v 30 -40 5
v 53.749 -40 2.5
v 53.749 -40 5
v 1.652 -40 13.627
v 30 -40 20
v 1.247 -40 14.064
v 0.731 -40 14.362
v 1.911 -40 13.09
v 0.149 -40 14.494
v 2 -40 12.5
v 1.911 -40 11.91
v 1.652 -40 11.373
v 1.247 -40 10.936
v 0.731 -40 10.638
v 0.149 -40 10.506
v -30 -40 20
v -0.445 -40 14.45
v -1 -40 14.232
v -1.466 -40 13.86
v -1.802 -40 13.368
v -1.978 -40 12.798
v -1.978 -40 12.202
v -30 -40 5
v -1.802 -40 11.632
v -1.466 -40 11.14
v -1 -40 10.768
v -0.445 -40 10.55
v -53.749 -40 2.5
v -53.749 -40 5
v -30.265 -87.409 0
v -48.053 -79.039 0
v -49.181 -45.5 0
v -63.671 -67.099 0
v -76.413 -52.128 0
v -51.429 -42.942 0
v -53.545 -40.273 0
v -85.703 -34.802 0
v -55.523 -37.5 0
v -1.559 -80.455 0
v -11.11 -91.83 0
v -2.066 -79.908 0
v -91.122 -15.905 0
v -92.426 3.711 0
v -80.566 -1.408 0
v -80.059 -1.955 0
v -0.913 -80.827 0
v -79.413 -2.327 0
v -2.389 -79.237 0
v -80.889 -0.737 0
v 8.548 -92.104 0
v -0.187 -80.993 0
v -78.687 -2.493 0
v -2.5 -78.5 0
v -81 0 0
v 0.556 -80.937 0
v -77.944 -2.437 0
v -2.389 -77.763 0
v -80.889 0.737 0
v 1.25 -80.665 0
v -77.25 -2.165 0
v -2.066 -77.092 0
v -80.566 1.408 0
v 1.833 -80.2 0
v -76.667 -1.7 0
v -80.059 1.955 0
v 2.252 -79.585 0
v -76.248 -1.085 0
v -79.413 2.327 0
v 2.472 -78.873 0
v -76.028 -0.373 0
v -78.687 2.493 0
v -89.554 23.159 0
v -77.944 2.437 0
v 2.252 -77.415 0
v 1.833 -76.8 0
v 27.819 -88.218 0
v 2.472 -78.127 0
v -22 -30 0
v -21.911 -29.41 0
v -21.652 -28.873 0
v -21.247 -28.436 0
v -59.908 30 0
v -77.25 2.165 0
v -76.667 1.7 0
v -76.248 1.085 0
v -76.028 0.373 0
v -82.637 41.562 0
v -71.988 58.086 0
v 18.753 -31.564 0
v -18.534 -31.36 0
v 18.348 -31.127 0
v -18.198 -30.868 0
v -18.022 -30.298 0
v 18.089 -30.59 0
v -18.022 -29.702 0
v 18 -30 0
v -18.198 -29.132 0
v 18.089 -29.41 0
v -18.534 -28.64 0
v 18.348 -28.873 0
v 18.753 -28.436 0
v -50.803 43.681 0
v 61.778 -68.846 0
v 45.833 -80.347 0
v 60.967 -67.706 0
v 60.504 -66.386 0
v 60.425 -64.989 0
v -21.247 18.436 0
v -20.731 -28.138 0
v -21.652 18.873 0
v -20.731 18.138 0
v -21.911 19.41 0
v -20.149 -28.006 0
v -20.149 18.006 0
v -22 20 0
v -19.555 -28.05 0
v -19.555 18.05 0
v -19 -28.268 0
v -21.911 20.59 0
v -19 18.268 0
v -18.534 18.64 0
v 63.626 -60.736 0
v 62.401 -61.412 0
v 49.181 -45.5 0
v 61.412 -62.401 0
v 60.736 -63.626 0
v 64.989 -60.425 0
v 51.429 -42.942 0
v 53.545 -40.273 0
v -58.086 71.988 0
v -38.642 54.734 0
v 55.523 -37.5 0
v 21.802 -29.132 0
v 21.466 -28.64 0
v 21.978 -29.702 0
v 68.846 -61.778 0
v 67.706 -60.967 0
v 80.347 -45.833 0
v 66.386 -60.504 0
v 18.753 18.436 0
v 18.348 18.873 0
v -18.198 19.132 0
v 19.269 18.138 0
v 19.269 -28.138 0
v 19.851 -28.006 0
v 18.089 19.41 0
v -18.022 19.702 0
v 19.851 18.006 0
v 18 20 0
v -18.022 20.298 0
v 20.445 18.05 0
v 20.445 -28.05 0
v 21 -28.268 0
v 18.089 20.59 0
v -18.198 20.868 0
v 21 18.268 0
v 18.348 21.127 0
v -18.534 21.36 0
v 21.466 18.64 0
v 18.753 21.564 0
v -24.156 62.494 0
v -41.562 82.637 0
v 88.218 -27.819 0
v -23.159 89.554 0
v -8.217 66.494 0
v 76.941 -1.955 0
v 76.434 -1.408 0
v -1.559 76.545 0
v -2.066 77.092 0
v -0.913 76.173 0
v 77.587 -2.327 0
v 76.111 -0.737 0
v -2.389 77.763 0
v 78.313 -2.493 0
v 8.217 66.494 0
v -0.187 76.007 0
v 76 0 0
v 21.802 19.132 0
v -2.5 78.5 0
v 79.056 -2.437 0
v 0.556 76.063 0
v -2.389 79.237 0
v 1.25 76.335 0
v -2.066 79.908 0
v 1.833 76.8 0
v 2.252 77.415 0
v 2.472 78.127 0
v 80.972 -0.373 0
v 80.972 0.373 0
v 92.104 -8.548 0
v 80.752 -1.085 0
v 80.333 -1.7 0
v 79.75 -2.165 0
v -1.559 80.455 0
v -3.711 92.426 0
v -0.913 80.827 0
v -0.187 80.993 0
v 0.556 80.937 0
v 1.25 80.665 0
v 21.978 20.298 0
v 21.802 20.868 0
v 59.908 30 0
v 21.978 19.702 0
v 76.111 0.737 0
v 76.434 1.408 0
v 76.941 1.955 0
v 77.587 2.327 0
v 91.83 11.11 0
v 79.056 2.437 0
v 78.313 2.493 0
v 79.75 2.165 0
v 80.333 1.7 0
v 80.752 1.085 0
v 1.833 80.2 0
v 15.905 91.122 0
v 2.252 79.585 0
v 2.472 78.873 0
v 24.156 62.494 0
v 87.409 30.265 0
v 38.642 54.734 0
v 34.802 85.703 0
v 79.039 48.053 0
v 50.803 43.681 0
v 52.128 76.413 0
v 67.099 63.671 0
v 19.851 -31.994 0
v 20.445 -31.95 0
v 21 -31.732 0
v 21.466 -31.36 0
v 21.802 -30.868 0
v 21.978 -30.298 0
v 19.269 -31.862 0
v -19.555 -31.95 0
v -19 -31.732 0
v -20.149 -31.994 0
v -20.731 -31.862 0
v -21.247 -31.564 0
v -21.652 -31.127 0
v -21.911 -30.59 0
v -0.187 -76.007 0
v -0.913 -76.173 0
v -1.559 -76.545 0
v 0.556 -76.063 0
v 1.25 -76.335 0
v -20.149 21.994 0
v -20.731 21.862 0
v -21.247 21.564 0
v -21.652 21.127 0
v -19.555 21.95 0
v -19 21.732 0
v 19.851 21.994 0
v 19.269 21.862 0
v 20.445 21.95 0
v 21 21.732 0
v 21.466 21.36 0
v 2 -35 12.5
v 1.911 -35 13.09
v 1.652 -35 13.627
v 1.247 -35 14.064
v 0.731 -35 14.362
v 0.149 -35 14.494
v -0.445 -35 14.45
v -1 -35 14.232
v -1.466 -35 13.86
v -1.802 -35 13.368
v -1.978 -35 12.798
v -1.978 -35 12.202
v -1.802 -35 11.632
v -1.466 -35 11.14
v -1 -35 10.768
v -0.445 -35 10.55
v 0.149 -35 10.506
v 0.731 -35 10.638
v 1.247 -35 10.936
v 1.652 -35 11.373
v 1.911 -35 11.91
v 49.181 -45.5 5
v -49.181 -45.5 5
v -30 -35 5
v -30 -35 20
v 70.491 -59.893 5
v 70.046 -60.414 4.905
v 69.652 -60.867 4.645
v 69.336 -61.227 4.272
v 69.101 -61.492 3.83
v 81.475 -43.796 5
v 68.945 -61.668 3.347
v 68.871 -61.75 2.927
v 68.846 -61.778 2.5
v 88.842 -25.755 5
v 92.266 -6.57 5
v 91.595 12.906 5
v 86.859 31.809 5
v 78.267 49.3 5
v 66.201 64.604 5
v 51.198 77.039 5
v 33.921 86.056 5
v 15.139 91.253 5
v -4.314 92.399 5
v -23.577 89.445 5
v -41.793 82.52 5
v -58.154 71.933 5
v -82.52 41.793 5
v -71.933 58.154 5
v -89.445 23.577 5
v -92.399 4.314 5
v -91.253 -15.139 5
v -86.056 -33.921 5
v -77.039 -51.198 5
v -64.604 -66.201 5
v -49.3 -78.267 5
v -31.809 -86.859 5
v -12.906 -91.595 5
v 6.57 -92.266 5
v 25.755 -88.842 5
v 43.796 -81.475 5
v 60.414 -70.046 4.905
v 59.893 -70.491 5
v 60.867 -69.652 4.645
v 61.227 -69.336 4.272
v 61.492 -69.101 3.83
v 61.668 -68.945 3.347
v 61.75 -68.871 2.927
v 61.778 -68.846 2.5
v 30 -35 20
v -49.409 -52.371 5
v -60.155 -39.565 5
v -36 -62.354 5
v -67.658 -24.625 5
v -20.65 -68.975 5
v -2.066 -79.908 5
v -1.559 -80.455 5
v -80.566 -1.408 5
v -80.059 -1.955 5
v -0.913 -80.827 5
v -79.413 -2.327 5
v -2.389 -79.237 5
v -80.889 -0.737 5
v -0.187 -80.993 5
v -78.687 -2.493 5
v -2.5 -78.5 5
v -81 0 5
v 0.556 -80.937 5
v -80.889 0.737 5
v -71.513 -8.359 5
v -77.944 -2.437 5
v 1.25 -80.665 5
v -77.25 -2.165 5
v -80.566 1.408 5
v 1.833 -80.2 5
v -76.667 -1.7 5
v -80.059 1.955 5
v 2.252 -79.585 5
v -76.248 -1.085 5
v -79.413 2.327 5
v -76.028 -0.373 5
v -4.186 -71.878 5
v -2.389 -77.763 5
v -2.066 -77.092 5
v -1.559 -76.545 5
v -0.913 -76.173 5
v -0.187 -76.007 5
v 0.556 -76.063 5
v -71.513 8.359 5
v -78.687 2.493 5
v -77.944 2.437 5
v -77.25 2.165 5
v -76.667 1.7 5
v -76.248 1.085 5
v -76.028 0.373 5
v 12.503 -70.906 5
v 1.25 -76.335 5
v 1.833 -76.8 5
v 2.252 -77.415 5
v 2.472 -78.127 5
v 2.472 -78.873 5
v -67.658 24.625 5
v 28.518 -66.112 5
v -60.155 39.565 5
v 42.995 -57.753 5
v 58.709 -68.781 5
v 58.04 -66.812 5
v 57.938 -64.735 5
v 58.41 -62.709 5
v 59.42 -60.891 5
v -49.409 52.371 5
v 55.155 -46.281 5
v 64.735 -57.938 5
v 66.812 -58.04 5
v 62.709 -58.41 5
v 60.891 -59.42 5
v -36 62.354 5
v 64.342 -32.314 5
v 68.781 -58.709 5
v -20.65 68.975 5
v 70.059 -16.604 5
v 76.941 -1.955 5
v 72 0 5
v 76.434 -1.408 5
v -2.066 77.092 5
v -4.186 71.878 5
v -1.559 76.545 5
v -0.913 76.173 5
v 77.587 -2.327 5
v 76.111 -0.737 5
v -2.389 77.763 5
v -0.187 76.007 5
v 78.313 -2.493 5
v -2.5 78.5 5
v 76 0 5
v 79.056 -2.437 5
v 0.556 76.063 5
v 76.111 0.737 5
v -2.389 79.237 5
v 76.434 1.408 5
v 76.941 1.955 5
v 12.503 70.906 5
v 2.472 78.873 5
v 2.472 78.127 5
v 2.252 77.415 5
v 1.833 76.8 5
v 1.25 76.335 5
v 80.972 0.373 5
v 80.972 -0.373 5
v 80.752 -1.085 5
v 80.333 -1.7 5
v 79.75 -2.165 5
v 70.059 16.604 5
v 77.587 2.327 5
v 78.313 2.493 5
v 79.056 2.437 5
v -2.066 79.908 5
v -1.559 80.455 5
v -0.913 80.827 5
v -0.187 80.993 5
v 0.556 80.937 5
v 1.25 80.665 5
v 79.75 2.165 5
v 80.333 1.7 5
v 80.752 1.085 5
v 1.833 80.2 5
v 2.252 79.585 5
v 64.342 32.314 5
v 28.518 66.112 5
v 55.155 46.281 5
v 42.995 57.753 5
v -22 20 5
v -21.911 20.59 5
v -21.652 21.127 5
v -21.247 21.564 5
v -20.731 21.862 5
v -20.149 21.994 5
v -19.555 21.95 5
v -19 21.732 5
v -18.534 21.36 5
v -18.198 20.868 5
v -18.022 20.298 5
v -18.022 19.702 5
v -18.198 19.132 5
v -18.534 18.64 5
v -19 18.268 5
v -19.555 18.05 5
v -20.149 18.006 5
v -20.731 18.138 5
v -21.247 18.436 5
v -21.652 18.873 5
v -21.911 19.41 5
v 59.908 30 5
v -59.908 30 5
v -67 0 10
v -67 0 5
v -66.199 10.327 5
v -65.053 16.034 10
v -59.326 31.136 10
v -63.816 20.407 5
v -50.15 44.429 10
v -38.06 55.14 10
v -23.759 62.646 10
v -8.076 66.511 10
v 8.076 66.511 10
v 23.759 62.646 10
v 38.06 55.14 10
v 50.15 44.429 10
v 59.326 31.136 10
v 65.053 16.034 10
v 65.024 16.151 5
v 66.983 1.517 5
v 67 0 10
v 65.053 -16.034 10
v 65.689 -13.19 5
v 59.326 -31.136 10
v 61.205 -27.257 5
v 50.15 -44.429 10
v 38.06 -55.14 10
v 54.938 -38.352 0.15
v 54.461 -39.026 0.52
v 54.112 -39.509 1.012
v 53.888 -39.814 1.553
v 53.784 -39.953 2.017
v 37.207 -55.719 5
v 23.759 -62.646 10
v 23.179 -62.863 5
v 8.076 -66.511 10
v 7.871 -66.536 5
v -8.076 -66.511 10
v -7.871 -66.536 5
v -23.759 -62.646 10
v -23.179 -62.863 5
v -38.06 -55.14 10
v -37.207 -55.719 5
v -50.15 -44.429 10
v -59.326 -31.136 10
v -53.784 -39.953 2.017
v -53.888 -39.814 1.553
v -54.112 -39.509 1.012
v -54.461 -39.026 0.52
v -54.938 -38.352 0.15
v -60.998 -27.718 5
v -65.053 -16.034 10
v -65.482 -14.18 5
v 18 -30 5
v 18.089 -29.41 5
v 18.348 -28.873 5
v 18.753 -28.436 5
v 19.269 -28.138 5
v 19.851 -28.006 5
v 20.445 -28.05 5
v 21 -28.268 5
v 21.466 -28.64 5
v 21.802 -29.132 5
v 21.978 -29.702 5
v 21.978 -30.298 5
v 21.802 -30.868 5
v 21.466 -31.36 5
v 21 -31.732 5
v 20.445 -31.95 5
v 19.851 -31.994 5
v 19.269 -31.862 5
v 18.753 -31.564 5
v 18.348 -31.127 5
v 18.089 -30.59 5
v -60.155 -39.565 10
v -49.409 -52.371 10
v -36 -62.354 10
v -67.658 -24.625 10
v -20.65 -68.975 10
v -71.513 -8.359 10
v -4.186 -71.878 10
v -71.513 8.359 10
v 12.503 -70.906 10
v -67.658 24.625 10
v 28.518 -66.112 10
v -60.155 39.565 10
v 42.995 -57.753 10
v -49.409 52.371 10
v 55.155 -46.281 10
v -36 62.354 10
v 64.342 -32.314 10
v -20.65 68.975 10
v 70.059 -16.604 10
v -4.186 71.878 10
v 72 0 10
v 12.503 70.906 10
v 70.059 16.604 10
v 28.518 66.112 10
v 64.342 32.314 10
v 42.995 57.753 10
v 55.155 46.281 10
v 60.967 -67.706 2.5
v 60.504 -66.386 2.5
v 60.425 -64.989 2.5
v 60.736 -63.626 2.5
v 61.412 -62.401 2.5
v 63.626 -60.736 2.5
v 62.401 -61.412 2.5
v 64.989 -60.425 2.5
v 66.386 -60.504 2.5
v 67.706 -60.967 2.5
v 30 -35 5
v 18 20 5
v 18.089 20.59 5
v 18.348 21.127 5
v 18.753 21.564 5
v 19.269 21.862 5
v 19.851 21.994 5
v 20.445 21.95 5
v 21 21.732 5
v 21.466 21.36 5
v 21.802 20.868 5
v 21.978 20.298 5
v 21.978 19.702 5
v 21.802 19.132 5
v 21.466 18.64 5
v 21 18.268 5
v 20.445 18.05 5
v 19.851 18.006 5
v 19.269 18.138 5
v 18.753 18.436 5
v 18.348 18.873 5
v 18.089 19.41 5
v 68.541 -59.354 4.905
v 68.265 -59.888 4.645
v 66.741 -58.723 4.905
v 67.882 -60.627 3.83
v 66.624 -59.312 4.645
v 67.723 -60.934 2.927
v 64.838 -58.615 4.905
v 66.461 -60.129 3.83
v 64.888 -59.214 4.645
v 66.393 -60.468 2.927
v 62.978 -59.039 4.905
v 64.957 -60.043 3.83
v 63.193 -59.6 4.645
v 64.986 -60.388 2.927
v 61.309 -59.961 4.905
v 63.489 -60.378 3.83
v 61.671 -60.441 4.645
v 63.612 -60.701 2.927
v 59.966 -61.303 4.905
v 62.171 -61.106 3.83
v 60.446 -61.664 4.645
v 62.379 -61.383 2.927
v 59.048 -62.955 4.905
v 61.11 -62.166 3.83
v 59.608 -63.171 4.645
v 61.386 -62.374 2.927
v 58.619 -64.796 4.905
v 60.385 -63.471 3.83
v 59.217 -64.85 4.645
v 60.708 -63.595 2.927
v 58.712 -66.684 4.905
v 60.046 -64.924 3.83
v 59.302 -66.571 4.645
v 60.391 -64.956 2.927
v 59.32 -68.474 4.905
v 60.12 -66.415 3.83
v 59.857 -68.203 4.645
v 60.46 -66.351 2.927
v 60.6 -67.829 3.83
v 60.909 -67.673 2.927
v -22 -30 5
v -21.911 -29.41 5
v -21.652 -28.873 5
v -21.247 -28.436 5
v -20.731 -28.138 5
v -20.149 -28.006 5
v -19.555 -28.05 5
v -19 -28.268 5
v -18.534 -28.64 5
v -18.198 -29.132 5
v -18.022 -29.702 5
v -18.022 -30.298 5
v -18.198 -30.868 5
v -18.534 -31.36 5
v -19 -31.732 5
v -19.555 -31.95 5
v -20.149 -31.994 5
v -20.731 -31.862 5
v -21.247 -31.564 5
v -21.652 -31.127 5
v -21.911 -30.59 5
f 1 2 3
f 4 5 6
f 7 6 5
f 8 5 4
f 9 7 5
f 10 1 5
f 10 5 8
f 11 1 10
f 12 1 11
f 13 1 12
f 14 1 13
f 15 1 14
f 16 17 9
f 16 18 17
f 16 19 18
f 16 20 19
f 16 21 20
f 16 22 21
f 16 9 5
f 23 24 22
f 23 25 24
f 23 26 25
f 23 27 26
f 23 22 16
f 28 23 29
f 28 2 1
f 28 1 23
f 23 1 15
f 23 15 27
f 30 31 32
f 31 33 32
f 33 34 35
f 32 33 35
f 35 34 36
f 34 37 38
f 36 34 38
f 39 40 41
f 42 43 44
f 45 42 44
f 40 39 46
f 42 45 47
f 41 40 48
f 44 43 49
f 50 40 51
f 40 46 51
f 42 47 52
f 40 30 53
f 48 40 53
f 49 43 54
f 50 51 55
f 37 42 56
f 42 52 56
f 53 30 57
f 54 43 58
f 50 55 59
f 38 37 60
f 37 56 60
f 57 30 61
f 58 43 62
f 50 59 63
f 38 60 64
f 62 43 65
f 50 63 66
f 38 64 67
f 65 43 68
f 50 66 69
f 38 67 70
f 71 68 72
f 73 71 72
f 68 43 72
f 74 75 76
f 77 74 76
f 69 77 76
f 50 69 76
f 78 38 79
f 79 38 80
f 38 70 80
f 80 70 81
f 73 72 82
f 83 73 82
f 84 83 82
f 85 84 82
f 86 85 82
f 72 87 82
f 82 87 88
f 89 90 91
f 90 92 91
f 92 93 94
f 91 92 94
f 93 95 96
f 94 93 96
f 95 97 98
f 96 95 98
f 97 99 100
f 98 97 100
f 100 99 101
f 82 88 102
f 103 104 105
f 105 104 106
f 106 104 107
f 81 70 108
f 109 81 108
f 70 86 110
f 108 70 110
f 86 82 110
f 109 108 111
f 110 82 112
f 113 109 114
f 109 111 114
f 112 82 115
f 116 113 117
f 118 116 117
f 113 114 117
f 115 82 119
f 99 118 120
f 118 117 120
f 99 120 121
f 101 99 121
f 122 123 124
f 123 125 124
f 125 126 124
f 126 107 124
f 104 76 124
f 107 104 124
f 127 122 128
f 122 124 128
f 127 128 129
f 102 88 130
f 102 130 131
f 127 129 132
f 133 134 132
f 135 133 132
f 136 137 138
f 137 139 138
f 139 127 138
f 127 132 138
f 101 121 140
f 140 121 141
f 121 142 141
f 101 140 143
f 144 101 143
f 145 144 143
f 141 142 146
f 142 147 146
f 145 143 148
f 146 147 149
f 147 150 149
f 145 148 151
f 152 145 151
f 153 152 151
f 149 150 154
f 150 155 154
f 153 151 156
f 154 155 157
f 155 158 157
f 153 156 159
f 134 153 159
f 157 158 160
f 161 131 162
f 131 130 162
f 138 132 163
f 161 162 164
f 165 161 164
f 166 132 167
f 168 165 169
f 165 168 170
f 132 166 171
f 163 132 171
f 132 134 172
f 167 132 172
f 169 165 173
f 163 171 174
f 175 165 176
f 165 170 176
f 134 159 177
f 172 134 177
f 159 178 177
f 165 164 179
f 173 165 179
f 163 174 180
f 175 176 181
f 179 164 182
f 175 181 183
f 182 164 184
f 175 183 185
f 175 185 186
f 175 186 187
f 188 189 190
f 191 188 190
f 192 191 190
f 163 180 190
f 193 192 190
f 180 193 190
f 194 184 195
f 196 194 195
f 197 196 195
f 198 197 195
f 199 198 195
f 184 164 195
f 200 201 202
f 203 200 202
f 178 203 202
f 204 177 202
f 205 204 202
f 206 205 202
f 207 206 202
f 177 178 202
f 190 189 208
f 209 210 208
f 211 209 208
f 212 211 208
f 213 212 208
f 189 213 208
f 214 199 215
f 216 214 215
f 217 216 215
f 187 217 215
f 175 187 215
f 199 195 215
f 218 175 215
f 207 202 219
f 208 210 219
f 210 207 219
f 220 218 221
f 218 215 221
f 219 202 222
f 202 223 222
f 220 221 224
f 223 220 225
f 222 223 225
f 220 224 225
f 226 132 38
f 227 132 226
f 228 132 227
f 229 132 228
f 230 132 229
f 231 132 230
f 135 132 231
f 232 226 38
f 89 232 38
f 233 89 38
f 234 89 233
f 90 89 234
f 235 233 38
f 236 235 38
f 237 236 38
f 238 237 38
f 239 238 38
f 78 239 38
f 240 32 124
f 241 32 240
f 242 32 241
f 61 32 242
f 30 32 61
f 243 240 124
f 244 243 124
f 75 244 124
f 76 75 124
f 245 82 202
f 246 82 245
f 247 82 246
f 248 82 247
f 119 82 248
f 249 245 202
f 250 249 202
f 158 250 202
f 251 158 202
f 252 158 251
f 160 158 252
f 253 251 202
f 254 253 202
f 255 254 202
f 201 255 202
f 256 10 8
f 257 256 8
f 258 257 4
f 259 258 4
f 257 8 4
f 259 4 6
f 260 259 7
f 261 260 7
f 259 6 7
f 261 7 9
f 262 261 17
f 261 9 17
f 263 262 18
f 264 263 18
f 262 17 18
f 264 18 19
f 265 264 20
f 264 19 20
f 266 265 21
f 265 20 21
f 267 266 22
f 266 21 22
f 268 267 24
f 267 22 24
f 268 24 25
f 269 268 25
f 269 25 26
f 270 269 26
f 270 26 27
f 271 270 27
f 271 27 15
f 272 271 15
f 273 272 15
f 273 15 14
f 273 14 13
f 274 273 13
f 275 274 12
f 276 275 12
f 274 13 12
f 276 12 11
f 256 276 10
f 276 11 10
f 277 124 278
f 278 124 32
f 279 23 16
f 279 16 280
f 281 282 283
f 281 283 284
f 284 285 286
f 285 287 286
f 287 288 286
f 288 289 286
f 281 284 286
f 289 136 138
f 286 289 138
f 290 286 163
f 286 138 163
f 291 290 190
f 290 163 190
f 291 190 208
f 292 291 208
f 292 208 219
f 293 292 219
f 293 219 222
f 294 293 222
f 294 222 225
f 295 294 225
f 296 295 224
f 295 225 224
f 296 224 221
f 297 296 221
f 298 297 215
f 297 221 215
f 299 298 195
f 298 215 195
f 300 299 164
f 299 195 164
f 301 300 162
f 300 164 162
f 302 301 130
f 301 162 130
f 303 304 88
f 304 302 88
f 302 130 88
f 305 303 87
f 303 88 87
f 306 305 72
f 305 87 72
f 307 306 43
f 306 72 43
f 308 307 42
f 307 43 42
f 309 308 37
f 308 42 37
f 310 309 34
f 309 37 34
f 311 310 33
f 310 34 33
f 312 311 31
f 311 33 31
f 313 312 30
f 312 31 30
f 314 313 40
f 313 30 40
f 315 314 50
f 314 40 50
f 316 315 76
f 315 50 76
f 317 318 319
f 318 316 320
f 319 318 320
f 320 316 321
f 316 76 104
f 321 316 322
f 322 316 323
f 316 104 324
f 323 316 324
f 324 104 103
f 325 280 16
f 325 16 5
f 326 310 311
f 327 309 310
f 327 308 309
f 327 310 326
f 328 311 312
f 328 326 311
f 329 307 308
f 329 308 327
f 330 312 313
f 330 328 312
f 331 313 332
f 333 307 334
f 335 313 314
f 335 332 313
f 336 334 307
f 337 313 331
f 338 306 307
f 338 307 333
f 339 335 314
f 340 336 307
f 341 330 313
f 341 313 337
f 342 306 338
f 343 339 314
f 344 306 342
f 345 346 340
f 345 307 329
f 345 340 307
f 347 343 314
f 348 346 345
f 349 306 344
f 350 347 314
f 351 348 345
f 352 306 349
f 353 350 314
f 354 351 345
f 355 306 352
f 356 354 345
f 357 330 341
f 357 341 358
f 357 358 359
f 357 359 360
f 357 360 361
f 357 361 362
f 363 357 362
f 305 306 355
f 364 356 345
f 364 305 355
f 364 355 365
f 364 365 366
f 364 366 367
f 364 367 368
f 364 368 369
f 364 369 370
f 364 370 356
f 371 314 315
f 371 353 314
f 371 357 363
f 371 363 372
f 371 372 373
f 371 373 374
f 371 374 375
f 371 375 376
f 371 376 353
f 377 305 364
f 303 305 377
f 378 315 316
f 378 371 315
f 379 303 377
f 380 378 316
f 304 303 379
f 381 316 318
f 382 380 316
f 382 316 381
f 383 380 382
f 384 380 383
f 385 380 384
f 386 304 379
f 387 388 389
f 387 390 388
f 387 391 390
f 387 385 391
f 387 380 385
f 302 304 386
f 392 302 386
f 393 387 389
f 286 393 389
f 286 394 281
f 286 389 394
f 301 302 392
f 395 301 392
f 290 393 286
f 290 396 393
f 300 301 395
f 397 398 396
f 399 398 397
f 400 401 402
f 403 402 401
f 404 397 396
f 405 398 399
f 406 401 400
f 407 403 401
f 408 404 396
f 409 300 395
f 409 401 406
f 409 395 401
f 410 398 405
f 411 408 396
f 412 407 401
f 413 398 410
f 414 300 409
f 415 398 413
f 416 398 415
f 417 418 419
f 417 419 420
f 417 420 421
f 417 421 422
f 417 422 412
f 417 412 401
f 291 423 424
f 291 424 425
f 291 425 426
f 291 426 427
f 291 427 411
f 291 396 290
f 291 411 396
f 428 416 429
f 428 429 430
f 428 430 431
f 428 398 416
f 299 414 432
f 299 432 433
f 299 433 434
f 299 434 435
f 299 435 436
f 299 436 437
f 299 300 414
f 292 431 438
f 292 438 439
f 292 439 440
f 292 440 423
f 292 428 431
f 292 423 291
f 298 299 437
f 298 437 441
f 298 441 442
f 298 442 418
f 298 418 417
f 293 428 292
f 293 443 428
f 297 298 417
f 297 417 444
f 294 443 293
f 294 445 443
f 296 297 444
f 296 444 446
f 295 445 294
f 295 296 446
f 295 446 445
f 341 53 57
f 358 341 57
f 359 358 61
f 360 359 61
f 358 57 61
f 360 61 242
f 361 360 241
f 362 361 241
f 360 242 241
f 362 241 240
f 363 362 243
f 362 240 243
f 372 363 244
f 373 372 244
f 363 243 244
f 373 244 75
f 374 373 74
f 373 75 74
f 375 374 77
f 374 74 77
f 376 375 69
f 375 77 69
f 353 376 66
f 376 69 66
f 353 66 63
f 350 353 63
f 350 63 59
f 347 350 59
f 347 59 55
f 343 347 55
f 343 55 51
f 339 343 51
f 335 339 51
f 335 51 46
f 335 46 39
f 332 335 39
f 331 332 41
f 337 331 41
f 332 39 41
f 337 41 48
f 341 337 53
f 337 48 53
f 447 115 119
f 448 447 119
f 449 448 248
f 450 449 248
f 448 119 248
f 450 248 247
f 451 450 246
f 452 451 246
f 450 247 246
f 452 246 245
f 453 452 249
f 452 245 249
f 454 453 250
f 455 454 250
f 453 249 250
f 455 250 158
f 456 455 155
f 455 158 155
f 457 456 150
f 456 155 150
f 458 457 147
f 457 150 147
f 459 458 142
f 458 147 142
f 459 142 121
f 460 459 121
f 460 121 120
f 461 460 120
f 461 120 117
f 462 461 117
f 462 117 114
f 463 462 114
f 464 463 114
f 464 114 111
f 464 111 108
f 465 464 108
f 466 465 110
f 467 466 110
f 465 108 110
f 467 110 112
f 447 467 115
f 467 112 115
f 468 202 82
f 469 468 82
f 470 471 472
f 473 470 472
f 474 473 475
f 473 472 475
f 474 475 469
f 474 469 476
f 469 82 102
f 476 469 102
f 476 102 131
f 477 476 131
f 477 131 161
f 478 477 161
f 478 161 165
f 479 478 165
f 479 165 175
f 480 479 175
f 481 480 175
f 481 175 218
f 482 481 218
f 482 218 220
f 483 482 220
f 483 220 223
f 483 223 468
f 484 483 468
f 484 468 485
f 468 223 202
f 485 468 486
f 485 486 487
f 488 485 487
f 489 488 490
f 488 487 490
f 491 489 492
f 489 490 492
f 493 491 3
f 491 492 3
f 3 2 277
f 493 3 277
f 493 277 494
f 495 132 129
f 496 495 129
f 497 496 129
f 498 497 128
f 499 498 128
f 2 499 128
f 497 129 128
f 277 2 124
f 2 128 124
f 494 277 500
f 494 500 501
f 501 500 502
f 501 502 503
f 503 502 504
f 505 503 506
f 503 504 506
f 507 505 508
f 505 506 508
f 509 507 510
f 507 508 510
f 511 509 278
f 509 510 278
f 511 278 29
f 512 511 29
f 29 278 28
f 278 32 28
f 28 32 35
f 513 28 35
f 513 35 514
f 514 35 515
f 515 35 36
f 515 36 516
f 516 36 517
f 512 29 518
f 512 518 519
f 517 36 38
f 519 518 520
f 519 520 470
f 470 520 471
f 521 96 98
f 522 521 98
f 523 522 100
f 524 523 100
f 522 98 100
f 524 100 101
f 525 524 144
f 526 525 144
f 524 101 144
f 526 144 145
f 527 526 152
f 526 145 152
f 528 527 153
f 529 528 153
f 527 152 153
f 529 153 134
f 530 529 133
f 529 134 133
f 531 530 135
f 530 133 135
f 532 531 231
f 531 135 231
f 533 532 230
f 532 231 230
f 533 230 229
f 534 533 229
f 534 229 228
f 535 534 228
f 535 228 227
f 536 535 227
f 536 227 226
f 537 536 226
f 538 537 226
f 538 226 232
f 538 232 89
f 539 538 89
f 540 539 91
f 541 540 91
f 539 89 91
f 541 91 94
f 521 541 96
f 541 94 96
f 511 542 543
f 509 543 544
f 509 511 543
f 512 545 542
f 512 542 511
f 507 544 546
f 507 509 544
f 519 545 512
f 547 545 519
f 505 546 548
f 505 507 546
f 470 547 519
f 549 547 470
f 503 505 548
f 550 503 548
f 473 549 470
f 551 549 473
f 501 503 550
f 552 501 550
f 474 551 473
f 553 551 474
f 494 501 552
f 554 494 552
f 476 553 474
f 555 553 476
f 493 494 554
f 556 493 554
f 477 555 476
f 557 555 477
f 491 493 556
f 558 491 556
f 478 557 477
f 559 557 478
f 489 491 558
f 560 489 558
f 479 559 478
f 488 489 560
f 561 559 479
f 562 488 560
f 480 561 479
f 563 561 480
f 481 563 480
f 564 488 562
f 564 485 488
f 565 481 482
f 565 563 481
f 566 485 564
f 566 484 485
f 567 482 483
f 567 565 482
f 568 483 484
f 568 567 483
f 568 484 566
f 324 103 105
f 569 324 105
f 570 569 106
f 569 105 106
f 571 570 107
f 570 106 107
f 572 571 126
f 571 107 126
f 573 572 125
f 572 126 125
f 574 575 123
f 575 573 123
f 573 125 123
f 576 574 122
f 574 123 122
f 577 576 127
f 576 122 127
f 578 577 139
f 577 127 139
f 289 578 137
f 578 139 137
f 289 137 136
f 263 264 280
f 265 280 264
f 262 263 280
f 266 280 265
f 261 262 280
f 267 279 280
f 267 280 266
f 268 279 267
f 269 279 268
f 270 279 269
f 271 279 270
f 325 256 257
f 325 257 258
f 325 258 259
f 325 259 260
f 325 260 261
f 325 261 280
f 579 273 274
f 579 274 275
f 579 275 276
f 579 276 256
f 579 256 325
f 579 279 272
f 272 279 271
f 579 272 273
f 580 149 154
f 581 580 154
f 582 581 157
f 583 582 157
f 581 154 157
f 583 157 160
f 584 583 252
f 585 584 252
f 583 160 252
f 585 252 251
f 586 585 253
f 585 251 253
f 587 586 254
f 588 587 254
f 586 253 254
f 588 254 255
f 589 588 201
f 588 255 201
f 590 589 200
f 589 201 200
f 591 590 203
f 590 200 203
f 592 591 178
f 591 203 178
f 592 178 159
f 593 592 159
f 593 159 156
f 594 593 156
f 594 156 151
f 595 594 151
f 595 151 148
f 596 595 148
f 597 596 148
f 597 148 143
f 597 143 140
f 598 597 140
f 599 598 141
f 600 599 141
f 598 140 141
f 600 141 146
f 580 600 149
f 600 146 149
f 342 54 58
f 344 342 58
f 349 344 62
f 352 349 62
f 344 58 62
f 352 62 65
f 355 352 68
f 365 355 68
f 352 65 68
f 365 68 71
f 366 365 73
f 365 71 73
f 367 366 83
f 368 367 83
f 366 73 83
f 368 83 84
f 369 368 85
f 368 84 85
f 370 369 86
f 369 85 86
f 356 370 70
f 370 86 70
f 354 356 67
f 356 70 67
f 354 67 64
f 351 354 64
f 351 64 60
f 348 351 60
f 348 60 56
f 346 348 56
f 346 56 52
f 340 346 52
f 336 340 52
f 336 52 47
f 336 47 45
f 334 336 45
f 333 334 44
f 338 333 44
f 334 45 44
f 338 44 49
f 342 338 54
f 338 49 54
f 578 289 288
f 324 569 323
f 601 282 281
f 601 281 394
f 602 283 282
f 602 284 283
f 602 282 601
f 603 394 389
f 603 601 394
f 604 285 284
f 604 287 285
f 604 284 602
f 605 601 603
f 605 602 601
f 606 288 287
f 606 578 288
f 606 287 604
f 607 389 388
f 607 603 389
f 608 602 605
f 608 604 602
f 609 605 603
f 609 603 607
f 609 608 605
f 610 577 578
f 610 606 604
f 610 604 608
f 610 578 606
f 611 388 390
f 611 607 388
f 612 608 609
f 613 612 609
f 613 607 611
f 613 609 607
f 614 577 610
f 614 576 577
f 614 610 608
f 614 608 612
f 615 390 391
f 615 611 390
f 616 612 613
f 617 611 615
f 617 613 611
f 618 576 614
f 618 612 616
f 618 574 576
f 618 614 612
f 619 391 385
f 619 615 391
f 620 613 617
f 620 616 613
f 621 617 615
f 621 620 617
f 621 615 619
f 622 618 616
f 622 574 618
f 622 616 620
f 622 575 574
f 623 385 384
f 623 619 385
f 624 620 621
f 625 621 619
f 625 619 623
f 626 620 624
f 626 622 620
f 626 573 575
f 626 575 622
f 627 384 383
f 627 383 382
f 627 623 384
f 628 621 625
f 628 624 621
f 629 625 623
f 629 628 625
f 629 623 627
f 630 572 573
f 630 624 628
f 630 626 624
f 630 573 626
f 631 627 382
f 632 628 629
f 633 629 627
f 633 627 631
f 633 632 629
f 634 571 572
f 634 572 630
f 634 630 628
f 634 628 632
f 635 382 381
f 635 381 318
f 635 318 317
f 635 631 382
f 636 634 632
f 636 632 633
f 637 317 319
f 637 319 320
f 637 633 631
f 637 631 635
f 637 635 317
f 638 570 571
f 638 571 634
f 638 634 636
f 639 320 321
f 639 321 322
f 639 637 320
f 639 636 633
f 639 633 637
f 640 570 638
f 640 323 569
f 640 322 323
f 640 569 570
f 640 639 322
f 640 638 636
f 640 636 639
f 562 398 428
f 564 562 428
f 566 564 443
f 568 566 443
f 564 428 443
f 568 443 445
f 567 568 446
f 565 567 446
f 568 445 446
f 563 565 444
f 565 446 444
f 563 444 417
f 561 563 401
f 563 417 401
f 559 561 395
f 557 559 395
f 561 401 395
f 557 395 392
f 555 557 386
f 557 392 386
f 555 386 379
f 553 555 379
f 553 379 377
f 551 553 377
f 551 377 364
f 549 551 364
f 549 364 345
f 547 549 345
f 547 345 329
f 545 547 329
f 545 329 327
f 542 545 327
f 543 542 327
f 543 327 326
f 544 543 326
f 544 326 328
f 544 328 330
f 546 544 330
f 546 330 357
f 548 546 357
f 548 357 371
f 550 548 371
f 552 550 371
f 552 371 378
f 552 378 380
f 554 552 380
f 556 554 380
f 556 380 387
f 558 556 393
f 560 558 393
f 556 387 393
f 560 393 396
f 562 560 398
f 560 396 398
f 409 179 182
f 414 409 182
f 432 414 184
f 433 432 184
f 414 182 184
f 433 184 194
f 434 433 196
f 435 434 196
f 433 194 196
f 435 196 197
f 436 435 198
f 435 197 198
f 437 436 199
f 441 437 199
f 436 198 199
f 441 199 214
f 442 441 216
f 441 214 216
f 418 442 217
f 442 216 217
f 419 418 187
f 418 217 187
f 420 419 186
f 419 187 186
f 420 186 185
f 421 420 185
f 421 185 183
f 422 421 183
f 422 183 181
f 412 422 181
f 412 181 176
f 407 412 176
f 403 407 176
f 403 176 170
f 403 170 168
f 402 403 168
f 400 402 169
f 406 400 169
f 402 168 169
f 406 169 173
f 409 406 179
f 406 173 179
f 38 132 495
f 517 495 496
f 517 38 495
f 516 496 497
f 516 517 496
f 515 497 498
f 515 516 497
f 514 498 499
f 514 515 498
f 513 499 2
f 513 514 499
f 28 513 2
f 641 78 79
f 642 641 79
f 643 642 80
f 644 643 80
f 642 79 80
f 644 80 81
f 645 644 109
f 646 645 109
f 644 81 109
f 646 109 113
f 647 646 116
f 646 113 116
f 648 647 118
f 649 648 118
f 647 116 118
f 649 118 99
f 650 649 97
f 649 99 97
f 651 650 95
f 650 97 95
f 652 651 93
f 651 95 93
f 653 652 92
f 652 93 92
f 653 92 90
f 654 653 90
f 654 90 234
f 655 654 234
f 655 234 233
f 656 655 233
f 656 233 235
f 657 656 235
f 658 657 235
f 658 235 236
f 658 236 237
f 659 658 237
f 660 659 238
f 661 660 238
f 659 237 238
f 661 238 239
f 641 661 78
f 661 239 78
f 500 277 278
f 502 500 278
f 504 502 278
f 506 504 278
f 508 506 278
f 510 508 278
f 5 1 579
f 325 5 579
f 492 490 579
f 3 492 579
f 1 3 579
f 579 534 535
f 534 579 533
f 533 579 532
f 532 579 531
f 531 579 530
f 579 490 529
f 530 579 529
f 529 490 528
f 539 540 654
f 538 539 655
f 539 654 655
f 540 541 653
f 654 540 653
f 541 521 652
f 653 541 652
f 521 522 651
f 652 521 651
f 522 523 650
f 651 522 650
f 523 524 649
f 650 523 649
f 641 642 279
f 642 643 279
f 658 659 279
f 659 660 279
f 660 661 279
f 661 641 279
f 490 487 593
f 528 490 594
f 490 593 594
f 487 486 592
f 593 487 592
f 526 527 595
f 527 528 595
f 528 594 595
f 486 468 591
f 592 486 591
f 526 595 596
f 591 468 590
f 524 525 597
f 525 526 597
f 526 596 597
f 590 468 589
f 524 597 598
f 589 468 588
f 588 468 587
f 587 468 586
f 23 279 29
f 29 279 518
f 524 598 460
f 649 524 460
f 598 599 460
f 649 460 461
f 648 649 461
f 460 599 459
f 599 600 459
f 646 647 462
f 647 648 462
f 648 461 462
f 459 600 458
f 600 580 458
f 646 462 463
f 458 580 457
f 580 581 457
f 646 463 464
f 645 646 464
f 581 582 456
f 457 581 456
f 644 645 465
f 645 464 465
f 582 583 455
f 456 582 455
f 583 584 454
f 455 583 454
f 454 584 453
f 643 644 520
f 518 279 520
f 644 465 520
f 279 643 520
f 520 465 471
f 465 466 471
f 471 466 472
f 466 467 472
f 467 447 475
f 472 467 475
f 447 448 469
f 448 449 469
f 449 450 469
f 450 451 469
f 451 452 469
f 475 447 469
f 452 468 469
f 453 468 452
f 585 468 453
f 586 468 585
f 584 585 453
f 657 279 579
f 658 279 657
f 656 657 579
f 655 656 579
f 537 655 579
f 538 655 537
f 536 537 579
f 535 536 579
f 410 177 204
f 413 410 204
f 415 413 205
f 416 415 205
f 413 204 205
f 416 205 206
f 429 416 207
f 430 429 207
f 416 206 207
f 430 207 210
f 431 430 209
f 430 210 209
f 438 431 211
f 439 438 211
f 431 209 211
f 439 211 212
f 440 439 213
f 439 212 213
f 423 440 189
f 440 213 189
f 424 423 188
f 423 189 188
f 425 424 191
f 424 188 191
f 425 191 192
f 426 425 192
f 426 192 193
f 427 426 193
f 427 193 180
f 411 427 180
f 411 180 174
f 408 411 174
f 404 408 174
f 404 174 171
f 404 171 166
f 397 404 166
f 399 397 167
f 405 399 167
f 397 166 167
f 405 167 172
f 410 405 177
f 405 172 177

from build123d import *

# Parameters (mm, degrees)
SKETCH1_R           = 92.5
BOSS_EXTRUDE1_DEPTH = 5
SKETCH2_R           = 72
BOSS_EXTRUDE2_DEPTH = 5
SKETCH3_R           = 67
CUT_EXTRUDE1_DEPTH  = 11
SKETCH4_W           = 140
SKETCH4_H           = 70
BOSS_EXTRUDE3_DEPTH = 5
FILLET1_R           = 2.5
SKETCH7_W           = 110
SKETCH7_H           = 25
BOSS_EXTRUDE5_DEPTH = 5
SKETCH11_R          = 2
CUT_EXTRUDE4_DEPTH  = 5
SKETCH12_R          = 2.5
CUT_EXTRUDE5_DEPTH  = 5
SKETCH6_W           = 60
SKETCH6_H           = 5
BOSS_EXTRUDE6_DEPTH = 15
SKETCH13_R          = 2
CUT_EXTRUDE6_DEPTH  = 5
SKETCH14_R          = 5
CUT_EXTRUDE7_DEPTH  = 10
FILLET2_R           = 2.5


with BuildPart() as part:
    # Sketch1 → Boss-Extrude1 (new body)
    with BuildSketch(Plane.XY):
        Circle(SKETCH1_R)
    extrude(amount=BOSS_EXTRUDE1_DEPTH)

    # Sketch2 → Boss-Extrude2 (add)
    with BuildSketch(Plane.XY.offset(5)):
        Circle(SKETCH2_R)
    extrude(amount=BOSS_EXTRUDE2_DEPTH)

    # Sketch3 → Cut-Extrude1 (cut, through all)
    with BuildSketch(Plane(origin=(0, 0, 0), x_dir=(-1, 0, 0), z_dir=(0, 0, -1))):
        Circle(SKETCH3_R)
    extrude(amount=-CUT_EXTRUDE1_DEPTH, mode=Mode.SUBTRACT)

    # Sketch4 → Boss-Extrude3 (add)
    with BuildSketch(Plane(origin=(0, 0, 0), x_dir=(-1, 0, 0), z_dir=(0, 0, -1))):
        with Locations((0, -5)):
            Rectangle(SKETCH4_W, SKETCH4_H)
    extrude(amount=-BOSS_EXTRUDE3_DEPTH)

    # Fillet1
    fillet1_edges = [part.edges().sort_by_distance(p)[0] for p in [
        (0, -40, 0),
    ]]
    fillet(fillet1_edges, radius=FILLET1_R)

    # Sketch7 → Boss-Extrude5 (add)
    with BuildSketch(Plane(origin=(0, 0, 0), x_dir=(-1, 0, 0), z_dir=(0, 0, -1))):
        with Locations((0, -58)):
            Rectangle(SKETCH7_W, SKETCH7_H)
    extrude(amount=-BOSS_EXTRUDE5_DEPTH)

    # Sketch11 → Cut-Extrude4 (cut)
    with BuildSketch(Plane(origin=(0, 0, 0), x_dir=(-1, 0, 0), z_dir=(0, 0, -1))):
        with Locations((-20, -30)):
            Circle(SKETCH11_R)
        with Locations((-20, 20)):
            Circle(SKETCH11_R)
        with Locations((20, 20)):
            Circle(SKETCH11_R)
        with Locations((20, -30)):
            Circle(SKETCH11_R)
    extrude(amount=-CUT_EXTRUDE4_DEPTH, mode=Mode.SUBTRACT)

    # Sketch12 → Cut-Extrude5 (cut)
    with BuildSketch(Plane(origin=(0, 0, 0), x_dir=(-1, 0, 0), z_dir=(0, 0, -1))):
        with Locations((0, -78.5)):
            Circle(SKETCH12_R)
        with Locations((-78.5, 0)):
            Circle(SKETCH12_R)
        with Locations((0, 78.5)):
            Circle(SKETCH12_R)
        with Locations((78.5, 0)):
            Circle(SKETCH12_R)
    extrude(amount=-CUT_EXTRUDE5_DEPTH, mode=Mode.SUBTRACT)

    # Sketch6 → Boss-Extrude6 (add)
    with BuildSketch(Plane.XY.offset(5)):
        with Locations((0, -37.5)):
            Rectangle(SKETCH6_W, SKETCH6_H)
    extrude(amount=BOSS_EXTRUDE6_DEPTH)

    # Sketch13 → Cut-Extrude6 (cut)
    with BuildSketch(Plane.XZ.offset(40)):
        with Locations((0, 12.5)):
            Circle(SKETCH13_R)
    extrude(amount=-CUT_EXTRUDE6_DEPTH, mode=Mode.SUBTRACT)

    # Sketch14 → Cut-Extrude7 (cut)
    with BuildSketch(Plane(origin=(0, 0, 0), x_dir=(-1, 0, 0), z_dir=(0, 0, -1))):
        with Locations((-65.40737726, -65.40737726)):
            Circle(SKETCH14_R)
    extrude(amount=-CUT_EXTRUDE7_DEPTH, mode=Mode.SUBTRACT)

    # Fillet2
    fillet2_edges = [part.edges().sort_by_distance(p)[0] for p in [
        (61.871843354, -61.871843354, 5),
    ]]
    fillet(fillet2_edges, radius=FILLET2_R)


solid = part.part
